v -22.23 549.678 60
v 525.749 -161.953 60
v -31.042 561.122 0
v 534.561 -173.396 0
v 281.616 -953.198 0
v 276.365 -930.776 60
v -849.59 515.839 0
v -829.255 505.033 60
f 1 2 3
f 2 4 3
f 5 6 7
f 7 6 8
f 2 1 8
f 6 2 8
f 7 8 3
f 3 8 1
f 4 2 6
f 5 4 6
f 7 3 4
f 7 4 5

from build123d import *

# Parameters (mm, degrees)
EXTRUDE_1_DEPTH    = 60
CHAMFER3_SIZE2     = 11.912970931
CHAMFER3_SIZE      = 60
CHAMFER4_SIZE2     = 11.912970931
CHAMFER4_SIZE      = 60
CHAMFER5_SIZE2     = 9.519169095
CHAMFER5_SIZE      = 60
CUT_EXTRUDE1_DEPTH = 1279.275631979


with BuildPart() as part:
    # Эскиз1 → Бобышка-Вытянуть1 (new body)
    with BuildSketch(Plane.XY):
        Polygon((-849.589927609, 515.838957491), (787.506047005, 606.405063543), (281.615569427, -953.197537878), align=None)
    extrude(amount=EXTRUDE_1_DEPTH)

    # Chamfer3
    chamfer3_edges = [part.edges().sort_by_distance(p)[0] for p in [
        (-31.041940302, 561.122010517, 60),
    ]]
    chamfer3_side = [part.faces().sort_by_distance(p)[0] for p in [
        (-31.041940302, 561.122010517, 59.761740581),
    ]]
    chamfer(chamfer3_edges, length=CHAMFER3_SIZE - 0.0001, length2=CHAMFER3_SIZE2 - 0.0001, reference=chamfer3_side[0])  # a hair under: the kernel refuses the full size

    # Chamfer4
    chamfer4_edges = [part.edges().sort_by_distance(p)[0] for p in [
        (532.590398399, -179.470785737, 60),
    ]]
    chamfer4_side = [part.faces().sort_by_distance(p)[0] for p in [
        (532.590398399, -179.470785737, 59.761740581),
    ]]
    chamfer(chamfer4_edges, length=CHAMFER4_SIZE - 0.0001, length2=CHAMFER4_SIZE2 - 0.0001, reference=chamfer4_side[0])  # a hair under: the kernel refuses the full size

    # Chamfer5
    chamfer5_edges = [part.edges().sort_by_distance(p)[0] for p in [
        (-283.987179091, -218.679290193, 60),
    ]]
    chamfer5_side = [part.faces().sort_by_distance(p)[0] for p in [
        (-283.987179091, -218.679290193, 59.809616618),
    ]]
    chamfer(chamfer5_edges, length=CHAMFER5_SIZE - 0.0001, length2=CHAMFER5_SIZE2 - 0.0001, reference=chamfer5_side[0])  # a hair under: the kernel refuses the full size

    # Sketch1 → Cut-Extrude1 (cut, through all)
    with BuildSketch(Plane(origin=(0, 0, 0), x_dir=(-1, 0, 0), z_dir=(0, 0, -1))):
        Polygon((-534.560808216, -173.396237168), (31.041940302, 561.122010517), (-787.506047005, 606.405063543), align=None)
    extrude(amount=-CUT_EXTRUDE1_DEPTH, mode=Mode.SUBTRACT)


solid = part.part
